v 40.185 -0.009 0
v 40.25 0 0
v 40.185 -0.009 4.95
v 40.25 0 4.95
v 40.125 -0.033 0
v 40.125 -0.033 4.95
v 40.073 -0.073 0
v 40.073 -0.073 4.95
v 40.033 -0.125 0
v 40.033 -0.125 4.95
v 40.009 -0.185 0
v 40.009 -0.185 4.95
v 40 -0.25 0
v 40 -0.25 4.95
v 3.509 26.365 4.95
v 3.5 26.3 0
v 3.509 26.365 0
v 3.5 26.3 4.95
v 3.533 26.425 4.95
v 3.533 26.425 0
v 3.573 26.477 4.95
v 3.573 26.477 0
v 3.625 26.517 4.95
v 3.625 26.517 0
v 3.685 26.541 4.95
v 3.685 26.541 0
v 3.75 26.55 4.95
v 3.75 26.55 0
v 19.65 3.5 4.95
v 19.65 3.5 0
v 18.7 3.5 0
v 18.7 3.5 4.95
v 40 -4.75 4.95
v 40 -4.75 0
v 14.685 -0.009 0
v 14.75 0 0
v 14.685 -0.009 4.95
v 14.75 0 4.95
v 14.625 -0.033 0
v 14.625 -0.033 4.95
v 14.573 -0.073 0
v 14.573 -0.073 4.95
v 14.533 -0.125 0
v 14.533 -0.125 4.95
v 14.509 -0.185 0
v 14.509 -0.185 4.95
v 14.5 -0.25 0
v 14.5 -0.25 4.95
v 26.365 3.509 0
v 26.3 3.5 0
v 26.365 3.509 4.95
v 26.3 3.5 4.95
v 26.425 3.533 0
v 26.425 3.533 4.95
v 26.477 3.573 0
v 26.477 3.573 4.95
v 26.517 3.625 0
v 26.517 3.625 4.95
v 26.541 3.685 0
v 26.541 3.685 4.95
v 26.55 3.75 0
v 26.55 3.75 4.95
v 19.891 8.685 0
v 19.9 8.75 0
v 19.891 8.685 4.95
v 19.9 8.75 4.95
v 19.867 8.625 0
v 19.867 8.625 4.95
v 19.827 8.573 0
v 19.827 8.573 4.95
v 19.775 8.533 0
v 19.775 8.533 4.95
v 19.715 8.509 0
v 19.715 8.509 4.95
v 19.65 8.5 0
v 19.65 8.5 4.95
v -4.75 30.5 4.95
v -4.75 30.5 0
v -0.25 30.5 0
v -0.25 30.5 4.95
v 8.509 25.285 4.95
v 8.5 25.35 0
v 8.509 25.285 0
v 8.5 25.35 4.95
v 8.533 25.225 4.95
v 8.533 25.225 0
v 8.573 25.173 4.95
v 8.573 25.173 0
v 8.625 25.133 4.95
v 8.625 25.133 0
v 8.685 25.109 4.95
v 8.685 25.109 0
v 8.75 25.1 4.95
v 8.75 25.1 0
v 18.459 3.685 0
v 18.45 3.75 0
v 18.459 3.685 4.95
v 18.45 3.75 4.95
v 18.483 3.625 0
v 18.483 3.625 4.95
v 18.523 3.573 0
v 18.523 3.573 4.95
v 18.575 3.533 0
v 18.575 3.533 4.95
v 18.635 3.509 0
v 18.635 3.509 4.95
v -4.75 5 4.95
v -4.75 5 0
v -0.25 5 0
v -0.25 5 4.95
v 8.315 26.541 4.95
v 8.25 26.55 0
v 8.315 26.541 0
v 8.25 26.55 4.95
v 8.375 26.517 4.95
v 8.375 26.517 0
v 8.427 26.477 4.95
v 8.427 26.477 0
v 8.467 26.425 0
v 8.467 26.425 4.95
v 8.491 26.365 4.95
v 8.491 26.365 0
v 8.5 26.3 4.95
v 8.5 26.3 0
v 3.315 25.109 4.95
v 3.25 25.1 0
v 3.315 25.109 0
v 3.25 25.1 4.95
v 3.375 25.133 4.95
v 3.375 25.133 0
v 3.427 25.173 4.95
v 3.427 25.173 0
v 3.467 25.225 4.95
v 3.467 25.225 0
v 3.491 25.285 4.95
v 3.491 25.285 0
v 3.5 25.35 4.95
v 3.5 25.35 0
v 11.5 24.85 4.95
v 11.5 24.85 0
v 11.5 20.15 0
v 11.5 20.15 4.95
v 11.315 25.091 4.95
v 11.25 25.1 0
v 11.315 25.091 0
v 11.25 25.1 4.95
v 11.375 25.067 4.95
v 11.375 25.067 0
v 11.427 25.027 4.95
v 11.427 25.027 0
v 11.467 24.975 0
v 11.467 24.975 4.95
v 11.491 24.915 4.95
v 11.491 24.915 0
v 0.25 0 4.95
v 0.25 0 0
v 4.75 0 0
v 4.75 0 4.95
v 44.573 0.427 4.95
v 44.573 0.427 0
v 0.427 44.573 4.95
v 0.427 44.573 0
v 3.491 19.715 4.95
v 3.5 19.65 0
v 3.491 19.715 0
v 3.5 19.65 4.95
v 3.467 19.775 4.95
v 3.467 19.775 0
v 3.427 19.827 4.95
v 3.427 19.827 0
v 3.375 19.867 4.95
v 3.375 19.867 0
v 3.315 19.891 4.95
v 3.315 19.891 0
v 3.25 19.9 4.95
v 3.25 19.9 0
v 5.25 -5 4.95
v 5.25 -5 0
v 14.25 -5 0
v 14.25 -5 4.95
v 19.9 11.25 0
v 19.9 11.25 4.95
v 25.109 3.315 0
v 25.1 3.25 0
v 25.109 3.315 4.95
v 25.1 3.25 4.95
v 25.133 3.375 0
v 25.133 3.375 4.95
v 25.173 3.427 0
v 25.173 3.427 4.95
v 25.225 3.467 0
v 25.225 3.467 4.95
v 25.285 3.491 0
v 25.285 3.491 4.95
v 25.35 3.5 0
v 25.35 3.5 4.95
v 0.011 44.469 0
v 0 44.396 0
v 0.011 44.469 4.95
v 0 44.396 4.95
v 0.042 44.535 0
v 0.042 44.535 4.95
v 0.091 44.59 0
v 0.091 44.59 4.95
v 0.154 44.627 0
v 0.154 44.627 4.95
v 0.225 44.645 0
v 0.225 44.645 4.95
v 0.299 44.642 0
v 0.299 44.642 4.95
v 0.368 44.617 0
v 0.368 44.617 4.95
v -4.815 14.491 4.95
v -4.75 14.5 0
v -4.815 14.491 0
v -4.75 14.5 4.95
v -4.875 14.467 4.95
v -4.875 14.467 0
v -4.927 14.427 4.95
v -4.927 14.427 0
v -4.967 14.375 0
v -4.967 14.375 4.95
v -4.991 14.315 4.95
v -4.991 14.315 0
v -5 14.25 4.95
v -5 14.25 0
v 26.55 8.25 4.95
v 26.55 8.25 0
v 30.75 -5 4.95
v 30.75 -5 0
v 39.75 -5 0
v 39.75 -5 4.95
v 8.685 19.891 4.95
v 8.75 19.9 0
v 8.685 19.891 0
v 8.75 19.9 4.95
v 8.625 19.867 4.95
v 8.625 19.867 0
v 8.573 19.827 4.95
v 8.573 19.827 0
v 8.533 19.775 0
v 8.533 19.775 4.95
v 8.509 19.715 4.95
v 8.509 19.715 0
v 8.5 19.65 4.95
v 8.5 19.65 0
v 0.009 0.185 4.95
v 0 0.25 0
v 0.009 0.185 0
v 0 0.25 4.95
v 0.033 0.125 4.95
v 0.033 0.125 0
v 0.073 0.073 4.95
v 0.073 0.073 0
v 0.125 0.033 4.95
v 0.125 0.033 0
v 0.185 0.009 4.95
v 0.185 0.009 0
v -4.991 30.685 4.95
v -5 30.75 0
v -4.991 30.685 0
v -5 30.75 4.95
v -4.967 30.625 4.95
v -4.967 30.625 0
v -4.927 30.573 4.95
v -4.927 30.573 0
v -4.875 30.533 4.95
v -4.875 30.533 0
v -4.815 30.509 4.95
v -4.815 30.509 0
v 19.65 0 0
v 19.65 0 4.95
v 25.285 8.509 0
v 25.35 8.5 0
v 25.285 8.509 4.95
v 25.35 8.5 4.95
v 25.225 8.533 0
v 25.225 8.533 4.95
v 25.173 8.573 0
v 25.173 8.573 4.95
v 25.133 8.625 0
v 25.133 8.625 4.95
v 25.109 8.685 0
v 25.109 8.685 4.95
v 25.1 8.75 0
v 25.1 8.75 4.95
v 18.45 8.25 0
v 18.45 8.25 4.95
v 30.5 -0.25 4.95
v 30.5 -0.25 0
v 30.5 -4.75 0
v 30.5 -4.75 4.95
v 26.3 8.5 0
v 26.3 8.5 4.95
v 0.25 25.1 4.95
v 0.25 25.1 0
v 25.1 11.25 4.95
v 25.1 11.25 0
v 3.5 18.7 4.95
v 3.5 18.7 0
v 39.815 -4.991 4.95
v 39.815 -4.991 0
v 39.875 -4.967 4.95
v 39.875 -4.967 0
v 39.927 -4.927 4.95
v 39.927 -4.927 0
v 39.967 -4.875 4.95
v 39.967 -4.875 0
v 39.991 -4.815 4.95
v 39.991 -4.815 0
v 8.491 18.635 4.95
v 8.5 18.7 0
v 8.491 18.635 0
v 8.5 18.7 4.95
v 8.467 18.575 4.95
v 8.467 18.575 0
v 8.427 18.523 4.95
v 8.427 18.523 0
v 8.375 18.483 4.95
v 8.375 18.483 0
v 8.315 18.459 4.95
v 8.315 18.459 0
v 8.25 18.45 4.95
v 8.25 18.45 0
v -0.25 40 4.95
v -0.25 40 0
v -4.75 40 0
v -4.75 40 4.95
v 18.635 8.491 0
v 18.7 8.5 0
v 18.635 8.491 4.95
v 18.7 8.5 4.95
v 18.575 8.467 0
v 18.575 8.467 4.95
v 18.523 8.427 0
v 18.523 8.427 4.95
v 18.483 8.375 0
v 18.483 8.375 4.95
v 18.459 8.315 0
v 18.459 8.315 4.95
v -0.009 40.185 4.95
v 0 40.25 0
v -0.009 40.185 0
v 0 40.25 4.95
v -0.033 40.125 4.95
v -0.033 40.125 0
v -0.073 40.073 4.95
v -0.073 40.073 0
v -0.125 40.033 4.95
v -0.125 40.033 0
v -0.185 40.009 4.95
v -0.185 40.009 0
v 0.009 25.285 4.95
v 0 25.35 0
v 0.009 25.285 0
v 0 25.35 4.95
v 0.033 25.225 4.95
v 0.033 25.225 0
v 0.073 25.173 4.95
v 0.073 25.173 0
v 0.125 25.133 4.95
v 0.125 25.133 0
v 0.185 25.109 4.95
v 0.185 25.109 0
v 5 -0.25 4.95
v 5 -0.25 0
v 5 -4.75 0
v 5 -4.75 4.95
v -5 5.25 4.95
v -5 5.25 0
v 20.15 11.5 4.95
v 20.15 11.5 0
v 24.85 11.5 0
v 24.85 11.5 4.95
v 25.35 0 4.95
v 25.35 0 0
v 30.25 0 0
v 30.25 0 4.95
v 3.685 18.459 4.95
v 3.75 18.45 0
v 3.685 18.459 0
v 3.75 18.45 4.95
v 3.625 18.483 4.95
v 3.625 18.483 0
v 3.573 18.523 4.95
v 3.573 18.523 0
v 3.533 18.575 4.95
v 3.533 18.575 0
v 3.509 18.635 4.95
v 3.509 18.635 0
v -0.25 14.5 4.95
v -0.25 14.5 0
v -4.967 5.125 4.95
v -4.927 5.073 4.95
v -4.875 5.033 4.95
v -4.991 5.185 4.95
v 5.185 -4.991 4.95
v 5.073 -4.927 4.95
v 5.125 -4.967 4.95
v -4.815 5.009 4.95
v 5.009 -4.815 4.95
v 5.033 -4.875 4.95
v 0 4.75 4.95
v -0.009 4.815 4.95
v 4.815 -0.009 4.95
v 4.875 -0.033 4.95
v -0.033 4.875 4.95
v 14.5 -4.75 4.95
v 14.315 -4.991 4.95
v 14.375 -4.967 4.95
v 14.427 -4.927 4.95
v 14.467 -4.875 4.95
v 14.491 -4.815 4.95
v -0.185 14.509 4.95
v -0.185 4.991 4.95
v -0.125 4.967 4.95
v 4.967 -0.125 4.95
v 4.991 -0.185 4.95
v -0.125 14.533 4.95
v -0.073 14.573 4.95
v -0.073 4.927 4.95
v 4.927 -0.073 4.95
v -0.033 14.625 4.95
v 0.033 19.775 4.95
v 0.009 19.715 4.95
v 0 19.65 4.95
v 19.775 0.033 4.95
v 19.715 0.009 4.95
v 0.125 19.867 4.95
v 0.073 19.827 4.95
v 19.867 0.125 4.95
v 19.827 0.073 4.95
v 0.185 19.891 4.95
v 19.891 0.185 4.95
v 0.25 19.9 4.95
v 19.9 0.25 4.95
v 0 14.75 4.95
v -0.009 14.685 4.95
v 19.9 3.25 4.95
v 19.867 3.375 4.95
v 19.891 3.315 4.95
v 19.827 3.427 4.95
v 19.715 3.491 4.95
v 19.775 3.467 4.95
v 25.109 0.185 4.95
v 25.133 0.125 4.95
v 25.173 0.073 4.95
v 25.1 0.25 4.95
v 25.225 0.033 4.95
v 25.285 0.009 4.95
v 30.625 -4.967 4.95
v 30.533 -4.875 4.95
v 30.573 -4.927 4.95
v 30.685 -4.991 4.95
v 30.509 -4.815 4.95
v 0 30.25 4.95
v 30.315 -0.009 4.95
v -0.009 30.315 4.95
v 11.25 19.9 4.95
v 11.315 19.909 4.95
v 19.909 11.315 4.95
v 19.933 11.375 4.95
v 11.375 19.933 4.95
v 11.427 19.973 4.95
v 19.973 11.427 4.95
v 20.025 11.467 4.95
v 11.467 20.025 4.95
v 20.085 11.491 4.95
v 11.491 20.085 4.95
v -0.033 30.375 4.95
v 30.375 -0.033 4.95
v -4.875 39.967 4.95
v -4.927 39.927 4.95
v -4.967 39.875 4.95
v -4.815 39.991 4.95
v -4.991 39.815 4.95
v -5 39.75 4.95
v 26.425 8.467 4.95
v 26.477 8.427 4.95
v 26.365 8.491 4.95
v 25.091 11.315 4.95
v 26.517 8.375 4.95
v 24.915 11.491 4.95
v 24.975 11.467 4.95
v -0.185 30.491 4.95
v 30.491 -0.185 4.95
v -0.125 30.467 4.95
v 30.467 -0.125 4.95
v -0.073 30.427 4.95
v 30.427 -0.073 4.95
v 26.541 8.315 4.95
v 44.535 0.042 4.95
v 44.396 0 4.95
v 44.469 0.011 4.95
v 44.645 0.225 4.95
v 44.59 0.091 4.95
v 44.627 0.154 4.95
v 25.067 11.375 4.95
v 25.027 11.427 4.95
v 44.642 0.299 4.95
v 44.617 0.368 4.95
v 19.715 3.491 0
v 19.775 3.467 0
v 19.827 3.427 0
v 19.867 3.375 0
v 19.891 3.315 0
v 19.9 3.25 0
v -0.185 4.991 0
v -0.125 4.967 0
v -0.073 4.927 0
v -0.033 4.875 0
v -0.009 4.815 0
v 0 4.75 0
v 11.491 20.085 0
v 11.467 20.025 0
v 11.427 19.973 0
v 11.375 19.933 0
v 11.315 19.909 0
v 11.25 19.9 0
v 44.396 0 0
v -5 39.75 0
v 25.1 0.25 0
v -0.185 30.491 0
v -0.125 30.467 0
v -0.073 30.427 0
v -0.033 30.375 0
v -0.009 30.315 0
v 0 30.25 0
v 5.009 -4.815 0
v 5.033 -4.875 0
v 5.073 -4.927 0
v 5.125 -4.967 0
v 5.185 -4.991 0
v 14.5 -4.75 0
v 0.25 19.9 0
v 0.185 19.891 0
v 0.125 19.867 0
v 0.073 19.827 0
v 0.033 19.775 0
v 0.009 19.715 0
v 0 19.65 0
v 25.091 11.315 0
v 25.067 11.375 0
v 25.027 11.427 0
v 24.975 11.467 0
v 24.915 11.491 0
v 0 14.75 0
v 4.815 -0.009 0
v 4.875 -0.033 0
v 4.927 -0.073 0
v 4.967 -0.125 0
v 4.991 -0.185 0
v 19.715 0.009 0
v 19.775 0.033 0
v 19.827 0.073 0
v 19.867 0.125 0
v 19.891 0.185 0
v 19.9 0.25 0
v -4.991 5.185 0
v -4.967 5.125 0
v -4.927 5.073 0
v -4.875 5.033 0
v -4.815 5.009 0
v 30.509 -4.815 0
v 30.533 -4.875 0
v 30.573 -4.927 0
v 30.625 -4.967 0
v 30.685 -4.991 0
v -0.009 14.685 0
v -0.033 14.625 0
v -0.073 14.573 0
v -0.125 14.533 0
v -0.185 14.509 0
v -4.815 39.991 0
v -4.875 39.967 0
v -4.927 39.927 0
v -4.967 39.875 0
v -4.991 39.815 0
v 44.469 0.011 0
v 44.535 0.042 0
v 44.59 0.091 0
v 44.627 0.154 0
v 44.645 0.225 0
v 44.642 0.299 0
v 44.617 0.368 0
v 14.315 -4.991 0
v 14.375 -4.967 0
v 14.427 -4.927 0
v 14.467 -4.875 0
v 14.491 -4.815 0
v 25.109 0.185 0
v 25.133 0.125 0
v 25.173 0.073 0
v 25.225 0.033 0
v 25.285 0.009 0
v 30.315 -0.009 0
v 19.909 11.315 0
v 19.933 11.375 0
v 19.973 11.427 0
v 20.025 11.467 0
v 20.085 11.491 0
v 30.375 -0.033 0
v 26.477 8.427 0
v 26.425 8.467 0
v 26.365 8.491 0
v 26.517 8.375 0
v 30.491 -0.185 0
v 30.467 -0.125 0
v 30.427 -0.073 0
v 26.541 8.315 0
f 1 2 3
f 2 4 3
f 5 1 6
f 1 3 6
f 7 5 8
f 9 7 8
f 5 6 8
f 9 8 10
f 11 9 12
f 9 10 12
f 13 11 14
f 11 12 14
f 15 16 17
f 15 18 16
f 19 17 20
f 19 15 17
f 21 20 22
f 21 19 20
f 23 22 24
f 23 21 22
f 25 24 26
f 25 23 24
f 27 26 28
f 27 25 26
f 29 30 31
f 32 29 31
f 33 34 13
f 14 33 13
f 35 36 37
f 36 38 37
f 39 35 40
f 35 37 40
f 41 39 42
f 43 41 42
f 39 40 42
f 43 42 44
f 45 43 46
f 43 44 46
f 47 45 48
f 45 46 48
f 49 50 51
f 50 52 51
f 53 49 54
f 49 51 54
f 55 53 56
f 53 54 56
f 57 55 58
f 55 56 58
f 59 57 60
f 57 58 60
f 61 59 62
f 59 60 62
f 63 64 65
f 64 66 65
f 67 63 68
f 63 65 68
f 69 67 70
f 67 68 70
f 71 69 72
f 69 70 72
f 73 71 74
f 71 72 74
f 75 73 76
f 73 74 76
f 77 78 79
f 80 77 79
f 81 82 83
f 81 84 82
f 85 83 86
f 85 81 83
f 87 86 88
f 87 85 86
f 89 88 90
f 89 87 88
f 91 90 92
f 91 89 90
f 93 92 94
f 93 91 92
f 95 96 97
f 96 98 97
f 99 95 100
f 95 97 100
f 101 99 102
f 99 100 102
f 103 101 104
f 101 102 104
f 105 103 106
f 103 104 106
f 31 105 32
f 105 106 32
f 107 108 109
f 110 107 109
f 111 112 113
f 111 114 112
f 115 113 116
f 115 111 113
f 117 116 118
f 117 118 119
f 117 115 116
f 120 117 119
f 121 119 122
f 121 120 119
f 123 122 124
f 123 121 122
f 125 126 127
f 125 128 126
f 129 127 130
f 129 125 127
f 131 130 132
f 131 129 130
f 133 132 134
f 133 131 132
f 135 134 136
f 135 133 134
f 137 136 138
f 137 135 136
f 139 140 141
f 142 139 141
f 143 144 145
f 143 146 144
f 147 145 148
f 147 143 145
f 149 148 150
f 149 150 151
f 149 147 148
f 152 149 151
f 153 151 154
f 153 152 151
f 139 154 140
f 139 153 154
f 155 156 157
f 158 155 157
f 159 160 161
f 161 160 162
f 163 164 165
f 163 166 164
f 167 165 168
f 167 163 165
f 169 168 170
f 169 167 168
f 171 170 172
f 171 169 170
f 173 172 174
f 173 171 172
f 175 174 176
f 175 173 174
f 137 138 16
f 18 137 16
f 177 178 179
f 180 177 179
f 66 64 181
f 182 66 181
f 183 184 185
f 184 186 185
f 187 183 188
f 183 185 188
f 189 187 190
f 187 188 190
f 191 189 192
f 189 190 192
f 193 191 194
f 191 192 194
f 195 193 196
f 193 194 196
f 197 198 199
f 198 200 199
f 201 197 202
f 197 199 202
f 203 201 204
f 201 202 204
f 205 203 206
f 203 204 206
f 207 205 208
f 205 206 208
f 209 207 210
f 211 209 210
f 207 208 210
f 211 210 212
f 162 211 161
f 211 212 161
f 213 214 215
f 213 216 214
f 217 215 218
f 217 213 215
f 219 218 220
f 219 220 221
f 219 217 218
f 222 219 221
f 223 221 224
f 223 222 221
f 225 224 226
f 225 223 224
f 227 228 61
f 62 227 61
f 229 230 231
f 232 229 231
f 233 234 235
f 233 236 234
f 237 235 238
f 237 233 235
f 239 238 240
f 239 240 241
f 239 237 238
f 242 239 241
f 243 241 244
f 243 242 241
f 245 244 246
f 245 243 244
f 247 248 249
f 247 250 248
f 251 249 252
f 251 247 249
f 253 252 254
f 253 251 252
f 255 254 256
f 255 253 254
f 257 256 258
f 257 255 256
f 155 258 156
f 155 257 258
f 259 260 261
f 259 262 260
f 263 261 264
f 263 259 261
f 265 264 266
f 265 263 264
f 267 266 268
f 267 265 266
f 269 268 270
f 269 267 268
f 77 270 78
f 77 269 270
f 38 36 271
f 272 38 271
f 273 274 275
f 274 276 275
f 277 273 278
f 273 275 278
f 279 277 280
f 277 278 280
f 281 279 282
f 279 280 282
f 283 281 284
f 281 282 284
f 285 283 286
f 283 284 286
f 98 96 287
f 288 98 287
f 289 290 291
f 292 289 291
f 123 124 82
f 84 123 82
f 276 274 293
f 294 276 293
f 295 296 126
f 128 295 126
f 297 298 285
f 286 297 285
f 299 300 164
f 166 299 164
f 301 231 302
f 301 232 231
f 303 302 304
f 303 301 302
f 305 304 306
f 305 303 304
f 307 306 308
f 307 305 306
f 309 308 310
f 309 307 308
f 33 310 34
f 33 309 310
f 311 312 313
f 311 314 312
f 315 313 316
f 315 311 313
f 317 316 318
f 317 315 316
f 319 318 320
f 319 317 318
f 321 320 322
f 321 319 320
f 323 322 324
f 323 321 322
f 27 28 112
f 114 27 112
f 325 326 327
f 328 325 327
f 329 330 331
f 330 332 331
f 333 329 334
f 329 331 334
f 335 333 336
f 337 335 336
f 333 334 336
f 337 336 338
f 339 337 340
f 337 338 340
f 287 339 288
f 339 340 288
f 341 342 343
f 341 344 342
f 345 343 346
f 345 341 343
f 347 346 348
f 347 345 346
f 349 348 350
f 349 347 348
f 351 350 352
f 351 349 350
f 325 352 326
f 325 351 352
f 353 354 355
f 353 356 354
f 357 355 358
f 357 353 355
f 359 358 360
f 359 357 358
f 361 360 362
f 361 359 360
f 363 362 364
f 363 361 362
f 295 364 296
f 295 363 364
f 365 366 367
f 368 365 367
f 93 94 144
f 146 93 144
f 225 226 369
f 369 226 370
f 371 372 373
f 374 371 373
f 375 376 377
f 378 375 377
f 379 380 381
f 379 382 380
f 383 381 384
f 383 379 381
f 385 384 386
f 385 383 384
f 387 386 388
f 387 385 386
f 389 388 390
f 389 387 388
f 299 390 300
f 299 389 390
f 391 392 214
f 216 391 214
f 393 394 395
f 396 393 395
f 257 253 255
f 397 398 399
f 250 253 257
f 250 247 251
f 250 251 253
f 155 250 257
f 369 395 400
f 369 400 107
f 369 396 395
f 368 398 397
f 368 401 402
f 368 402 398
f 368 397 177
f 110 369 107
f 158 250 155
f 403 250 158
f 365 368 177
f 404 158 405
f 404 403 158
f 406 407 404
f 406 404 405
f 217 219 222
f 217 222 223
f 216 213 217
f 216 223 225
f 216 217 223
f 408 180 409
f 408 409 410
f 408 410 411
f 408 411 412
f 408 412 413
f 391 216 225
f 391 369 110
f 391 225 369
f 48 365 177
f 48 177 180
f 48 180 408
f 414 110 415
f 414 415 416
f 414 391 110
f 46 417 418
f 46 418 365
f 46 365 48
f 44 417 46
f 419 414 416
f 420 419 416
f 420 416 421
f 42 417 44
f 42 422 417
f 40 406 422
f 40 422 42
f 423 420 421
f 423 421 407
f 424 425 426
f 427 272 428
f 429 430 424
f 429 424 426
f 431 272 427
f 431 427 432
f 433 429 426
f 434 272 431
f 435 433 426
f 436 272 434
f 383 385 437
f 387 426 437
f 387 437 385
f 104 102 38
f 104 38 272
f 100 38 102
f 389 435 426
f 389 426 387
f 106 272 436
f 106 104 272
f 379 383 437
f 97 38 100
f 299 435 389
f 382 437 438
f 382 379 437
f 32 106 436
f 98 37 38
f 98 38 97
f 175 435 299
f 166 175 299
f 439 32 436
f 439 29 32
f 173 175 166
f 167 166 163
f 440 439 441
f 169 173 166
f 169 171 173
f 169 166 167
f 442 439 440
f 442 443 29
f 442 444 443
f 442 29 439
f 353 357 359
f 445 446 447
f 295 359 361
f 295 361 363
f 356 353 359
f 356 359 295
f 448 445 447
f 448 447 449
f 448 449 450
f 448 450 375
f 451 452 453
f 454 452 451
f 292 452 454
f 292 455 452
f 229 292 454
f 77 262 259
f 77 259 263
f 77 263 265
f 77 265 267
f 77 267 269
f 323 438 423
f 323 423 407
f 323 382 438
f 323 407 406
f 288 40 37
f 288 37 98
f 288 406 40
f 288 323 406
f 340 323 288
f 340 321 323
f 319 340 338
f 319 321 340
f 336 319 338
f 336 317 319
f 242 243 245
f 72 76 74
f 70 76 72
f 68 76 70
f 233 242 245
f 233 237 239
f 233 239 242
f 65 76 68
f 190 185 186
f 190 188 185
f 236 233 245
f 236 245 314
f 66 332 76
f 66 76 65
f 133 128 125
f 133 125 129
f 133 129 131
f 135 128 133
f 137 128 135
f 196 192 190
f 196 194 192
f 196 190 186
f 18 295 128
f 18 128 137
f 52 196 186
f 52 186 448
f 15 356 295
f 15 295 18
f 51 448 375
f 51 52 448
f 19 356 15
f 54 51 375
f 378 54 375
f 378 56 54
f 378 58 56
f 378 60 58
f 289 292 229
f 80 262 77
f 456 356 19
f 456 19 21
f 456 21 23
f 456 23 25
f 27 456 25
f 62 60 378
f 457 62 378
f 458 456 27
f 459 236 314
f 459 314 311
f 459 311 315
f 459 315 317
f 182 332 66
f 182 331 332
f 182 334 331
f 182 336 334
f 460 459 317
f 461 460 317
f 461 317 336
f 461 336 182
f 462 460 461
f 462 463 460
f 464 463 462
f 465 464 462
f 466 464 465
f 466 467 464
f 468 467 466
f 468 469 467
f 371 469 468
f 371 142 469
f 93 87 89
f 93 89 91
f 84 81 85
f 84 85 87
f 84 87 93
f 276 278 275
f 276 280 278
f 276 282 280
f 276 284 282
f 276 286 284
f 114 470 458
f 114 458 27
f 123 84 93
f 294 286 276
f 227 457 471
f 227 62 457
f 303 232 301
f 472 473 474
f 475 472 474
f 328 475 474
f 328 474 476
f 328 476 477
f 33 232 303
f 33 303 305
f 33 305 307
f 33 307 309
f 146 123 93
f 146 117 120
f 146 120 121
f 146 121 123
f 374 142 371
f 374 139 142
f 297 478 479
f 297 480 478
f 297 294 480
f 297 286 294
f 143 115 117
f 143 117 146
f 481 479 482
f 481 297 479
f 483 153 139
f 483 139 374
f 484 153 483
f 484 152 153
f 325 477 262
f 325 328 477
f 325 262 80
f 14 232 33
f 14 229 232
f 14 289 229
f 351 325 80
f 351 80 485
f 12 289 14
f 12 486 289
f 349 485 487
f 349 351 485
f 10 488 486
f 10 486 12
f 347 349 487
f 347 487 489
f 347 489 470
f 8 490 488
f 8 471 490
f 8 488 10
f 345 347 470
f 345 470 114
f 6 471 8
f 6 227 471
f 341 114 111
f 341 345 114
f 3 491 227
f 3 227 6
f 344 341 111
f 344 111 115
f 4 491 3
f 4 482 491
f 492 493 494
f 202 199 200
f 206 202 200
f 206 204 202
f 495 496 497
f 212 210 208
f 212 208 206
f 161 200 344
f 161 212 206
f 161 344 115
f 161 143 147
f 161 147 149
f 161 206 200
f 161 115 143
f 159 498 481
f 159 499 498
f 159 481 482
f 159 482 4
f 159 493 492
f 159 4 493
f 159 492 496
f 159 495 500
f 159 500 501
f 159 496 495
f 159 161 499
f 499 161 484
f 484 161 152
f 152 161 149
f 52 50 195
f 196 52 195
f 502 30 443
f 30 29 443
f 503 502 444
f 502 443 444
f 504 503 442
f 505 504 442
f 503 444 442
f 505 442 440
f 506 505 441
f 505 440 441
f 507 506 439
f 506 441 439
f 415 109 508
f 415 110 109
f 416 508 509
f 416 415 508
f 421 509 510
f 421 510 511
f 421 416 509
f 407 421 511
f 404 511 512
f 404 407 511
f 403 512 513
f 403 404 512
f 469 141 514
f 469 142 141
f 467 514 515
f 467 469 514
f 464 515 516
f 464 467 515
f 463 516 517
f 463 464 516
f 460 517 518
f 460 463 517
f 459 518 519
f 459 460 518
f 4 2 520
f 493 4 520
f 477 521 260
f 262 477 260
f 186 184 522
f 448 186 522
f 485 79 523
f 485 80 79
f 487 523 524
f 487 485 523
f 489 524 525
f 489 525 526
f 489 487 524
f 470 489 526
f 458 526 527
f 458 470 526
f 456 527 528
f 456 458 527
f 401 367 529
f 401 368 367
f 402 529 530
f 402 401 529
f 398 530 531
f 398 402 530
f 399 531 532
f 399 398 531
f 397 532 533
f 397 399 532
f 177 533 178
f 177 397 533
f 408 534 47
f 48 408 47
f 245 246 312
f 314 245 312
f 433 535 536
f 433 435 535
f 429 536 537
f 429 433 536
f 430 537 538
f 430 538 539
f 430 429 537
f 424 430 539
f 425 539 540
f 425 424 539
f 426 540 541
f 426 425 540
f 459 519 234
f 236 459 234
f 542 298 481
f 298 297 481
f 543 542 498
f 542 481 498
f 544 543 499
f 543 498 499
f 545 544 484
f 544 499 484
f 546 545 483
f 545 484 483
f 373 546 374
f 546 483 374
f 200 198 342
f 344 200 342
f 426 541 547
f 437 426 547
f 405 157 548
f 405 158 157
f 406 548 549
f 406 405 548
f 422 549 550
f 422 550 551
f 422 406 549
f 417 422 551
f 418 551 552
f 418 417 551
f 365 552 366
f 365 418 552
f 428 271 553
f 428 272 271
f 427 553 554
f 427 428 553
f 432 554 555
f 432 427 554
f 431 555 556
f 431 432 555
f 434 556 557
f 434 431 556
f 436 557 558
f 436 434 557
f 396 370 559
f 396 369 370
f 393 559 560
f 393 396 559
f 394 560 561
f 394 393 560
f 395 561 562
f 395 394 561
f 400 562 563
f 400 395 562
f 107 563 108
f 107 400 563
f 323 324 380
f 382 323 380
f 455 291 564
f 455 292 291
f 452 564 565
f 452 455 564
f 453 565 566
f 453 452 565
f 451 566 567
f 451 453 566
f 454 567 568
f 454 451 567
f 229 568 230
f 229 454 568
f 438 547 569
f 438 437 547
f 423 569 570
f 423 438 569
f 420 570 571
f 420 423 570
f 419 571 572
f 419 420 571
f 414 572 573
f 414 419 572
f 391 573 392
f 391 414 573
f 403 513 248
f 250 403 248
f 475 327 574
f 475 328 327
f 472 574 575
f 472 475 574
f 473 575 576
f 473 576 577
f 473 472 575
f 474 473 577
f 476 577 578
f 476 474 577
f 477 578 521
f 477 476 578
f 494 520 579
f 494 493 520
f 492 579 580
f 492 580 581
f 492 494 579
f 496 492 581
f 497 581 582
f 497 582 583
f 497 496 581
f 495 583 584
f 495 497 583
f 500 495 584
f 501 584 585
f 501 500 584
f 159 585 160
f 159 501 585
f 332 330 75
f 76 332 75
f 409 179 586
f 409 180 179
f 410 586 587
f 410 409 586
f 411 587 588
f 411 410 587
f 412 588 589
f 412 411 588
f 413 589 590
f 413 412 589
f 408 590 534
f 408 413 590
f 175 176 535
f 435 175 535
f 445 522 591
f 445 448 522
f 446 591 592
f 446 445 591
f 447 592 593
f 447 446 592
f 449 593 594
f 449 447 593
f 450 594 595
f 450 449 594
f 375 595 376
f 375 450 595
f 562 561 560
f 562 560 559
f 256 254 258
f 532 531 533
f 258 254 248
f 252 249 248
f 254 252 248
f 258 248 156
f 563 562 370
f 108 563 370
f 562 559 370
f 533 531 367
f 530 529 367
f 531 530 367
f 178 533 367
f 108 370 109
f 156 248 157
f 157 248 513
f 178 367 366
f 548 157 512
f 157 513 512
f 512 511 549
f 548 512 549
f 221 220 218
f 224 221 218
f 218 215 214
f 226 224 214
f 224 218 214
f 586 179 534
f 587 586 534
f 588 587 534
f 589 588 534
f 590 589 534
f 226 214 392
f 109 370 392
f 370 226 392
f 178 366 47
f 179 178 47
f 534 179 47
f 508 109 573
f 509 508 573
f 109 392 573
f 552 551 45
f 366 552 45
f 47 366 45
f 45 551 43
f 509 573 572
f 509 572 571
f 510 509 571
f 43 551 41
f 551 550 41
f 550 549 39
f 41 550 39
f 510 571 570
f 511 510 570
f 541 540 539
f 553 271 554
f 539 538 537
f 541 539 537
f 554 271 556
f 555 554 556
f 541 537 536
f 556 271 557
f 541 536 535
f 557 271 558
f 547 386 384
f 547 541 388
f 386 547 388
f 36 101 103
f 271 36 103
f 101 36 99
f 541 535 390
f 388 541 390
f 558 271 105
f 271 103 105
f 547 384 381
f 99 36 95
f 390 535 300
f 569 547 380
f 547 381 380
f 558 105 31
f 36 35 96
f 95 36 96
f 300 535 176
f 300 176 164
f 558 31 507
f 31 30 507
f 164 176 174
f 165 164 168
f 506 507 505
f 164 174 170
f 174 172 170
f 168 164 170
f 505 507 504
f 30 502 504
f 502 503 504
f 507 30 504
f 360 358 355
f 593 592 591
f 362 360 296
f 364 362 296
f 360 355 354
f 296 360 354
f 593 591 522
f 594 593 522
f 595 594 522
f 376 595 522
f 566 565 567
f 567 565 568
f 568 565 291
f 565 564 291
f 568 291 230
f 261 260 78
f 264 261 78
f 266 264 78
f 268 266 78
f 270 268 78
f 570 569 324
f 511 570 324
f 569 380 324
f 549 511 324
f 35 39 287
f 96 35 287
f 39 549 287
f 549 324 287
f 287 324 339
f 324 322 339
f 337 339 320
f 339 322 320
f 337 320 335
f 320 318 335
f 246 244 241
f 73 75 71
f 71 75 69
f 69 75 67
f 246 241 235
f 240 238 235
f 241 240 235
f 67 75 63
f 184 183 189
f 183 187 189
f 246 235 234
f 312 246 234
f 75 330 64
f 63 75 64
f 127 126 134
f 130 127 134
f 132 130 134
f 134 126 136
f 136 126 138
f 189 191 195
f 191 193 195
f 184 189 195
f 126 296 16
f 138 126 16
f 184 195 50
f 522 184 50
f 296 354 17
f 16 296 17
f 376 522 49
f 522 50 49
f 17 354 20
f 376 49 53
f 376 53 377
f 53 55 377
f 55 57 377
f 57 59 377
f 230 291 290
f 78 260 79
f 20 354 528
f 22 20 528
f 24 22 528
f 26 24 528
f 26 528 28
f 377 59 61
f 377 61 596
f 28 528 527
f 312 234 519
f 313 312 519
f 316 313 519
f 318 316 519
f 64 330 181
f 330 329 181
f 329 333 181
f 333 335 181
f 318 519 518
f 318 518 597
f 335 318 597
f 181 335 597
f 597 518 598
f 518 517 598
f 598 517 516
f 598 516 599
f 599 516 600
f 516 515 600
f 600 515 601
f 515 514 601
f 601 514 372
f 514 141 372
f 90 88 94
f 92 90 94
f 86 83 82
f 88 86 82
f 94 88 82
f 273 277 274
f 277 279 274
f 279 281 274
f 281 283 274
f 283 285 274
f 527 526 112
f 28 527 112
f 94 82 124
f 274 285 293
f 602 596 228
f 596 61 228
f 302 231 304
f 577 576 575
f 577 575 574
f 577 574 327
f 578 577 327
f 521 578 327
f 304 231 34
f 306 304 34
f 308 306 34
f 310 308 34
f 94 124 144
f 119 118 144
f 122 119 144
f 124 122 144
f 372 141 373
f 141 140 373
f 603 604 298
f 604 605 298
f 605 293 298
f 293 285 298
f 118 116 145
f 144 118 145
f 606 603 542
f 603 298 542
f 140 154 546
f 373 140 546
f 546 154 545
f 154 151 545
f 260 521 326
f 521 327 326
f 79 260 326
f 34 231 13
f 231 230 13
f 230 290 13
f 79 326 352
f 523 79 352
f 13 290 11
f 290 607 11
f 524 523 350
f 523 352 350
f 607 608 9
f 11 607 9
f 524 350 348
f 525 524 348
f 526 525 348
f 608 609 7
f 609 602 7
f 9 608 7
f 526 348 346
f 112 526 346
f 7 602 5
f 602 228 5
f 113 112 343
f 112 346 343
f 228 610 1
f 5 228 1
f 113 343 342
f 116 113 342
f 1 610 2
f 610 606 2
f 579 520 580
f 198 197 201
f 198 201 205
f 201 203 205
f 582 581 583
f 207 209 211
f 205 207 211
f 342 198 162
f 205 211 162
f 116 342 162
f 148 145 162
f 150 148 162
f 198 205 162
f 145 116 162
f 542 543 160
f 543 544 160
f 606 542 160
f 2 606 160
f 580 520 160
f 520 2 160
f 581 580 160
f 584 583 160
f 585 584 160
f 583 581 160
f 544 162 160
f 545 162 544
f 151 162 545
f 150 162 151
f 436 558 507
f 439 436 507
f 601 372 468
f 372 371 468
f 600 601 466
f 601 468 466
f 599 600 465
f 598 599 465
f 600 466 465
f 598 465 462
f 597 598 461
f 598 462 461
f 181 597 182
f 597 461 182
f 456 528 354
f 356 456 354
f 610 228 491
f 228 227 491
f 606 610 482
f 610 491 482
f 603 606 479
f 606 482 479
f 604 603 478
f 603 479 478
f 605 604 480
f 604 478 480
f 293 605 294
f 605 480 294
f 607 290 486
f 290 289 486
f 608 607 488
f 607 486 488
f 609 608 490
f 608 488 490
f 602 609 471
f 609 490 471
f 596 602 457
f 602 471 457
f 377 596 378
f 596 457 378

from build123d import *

# Parameters (mm, degrees)
BOSS_EXTRUDE1_DEPTH = 4.95
FILLET1_R           = 0.25
FILLET2_R           = 0.25


with BuildPart() as part:
    # Sketch2 → Boss-Extrude1 (new body)
    with BuildSketch(Plane.XY):
        Polygon((0, 45), (0, 40), (-5, 40), (-5, 30.5), (0, 30.5), (0, 25.1), (3.5, 25.1), (3.5, 26.55), (8.5, 26.55), (8.5, 25.1), (11.5, 25.1), (11.5, 19.9), (8.5, 19.9), (8.5, 18.45), (3.5, 18.45), (3.5, 19.9), (0, 19.9), (0, 14.5), (-5, 14.5), (-5, 5), (0, 5), (0, 0), (5, 0), (5, -5), (14.5, -5), (14.5, 0), (19.9, 0), (19.9, 3.5), (18.45, 3.5), (18.45, 8.5), (19.9, 8.5), (19.9, 11.5), (25.1, 11.5), (25.1, 8.5), (26.55, 8.5), (26.55, 3.5), (25.1, 3.5), (25.1, 0), (30.5, 0), (30.5, -5), (40, -5), (40, 0), (45, 0), align=None)
    extrude(amount=BOSS_EXTRUDE1_DEPTH)

    # Fillet1
    fillet1_edges = [part.edges().sort_by_distance(p)[0] for p in [
        (-5, 5, 2.475),
        (-5, 14.5, 2.475),
        (0, 19.9, 2.475),
        (0, 25.1, 2.475),
        (-5, 30.5, 2.475),
        (-5, 40, 2.475),
        (0, 45, 2.475),
        (45, 0, 2.475),
        (40, -5, 2.475),
        (30.5, -5, 2.475),
        (25.1, 0, 2.475),
        (19.9, 0, 2.475),
        (14.5, -5, 2.475),
        (5, -5, 2.475),
        (0, 0, 2.475),
    ]]
    fillet(fillet1_edges, radius=FILLET1_R)

    # Fillet2
    fillet2_edges = [part.edges().sort_by_distance(p)[0] for p in [
        (0, 5, 2.475),
        (0, 14.5, 2.475),
        (3.5, 19.9, 2.475),
        (3.5, 18.45, 2.475),
        (8.5, 18.45, 2.475),
        (8.5, 19.9, 2.475),
        (11.5, 19.9, 2.475),
        (11.5, 25.1, 2.475),
        (8.5, 25.1, 2.475),
        (8.5, 26.55, 2.475),
        (3.5, 26.55, 2.475),
        (3.5, 25.1, 2.475),
        (0, 30.5, 2.475),
        (0, 40, 2.475),
        (40, 0, 2.475),
        (30.5, 0, 2.475),
        (25.1, 3.5, 2.475),
        (26.55, 3.5, 2.475),
        (26.55, 8.5, 2.475),
        (25.1, 8.5, 2.475),
        (25.1, 11.5, 2.475),
        (19.9, 11.5, 2.475),
        (19.9, 8.5, 2.475),
        (18.45, 8.5, 2.475),
        (18.45, 3.5, 2.475),
        (19.9, 3.5, 2.475),
        (14.5, 0, 2.475),
        (5, 0, 2.475),
    ]]
    fillet(fillet2_edges, radius=FILLET2_R)


solid = part.part
